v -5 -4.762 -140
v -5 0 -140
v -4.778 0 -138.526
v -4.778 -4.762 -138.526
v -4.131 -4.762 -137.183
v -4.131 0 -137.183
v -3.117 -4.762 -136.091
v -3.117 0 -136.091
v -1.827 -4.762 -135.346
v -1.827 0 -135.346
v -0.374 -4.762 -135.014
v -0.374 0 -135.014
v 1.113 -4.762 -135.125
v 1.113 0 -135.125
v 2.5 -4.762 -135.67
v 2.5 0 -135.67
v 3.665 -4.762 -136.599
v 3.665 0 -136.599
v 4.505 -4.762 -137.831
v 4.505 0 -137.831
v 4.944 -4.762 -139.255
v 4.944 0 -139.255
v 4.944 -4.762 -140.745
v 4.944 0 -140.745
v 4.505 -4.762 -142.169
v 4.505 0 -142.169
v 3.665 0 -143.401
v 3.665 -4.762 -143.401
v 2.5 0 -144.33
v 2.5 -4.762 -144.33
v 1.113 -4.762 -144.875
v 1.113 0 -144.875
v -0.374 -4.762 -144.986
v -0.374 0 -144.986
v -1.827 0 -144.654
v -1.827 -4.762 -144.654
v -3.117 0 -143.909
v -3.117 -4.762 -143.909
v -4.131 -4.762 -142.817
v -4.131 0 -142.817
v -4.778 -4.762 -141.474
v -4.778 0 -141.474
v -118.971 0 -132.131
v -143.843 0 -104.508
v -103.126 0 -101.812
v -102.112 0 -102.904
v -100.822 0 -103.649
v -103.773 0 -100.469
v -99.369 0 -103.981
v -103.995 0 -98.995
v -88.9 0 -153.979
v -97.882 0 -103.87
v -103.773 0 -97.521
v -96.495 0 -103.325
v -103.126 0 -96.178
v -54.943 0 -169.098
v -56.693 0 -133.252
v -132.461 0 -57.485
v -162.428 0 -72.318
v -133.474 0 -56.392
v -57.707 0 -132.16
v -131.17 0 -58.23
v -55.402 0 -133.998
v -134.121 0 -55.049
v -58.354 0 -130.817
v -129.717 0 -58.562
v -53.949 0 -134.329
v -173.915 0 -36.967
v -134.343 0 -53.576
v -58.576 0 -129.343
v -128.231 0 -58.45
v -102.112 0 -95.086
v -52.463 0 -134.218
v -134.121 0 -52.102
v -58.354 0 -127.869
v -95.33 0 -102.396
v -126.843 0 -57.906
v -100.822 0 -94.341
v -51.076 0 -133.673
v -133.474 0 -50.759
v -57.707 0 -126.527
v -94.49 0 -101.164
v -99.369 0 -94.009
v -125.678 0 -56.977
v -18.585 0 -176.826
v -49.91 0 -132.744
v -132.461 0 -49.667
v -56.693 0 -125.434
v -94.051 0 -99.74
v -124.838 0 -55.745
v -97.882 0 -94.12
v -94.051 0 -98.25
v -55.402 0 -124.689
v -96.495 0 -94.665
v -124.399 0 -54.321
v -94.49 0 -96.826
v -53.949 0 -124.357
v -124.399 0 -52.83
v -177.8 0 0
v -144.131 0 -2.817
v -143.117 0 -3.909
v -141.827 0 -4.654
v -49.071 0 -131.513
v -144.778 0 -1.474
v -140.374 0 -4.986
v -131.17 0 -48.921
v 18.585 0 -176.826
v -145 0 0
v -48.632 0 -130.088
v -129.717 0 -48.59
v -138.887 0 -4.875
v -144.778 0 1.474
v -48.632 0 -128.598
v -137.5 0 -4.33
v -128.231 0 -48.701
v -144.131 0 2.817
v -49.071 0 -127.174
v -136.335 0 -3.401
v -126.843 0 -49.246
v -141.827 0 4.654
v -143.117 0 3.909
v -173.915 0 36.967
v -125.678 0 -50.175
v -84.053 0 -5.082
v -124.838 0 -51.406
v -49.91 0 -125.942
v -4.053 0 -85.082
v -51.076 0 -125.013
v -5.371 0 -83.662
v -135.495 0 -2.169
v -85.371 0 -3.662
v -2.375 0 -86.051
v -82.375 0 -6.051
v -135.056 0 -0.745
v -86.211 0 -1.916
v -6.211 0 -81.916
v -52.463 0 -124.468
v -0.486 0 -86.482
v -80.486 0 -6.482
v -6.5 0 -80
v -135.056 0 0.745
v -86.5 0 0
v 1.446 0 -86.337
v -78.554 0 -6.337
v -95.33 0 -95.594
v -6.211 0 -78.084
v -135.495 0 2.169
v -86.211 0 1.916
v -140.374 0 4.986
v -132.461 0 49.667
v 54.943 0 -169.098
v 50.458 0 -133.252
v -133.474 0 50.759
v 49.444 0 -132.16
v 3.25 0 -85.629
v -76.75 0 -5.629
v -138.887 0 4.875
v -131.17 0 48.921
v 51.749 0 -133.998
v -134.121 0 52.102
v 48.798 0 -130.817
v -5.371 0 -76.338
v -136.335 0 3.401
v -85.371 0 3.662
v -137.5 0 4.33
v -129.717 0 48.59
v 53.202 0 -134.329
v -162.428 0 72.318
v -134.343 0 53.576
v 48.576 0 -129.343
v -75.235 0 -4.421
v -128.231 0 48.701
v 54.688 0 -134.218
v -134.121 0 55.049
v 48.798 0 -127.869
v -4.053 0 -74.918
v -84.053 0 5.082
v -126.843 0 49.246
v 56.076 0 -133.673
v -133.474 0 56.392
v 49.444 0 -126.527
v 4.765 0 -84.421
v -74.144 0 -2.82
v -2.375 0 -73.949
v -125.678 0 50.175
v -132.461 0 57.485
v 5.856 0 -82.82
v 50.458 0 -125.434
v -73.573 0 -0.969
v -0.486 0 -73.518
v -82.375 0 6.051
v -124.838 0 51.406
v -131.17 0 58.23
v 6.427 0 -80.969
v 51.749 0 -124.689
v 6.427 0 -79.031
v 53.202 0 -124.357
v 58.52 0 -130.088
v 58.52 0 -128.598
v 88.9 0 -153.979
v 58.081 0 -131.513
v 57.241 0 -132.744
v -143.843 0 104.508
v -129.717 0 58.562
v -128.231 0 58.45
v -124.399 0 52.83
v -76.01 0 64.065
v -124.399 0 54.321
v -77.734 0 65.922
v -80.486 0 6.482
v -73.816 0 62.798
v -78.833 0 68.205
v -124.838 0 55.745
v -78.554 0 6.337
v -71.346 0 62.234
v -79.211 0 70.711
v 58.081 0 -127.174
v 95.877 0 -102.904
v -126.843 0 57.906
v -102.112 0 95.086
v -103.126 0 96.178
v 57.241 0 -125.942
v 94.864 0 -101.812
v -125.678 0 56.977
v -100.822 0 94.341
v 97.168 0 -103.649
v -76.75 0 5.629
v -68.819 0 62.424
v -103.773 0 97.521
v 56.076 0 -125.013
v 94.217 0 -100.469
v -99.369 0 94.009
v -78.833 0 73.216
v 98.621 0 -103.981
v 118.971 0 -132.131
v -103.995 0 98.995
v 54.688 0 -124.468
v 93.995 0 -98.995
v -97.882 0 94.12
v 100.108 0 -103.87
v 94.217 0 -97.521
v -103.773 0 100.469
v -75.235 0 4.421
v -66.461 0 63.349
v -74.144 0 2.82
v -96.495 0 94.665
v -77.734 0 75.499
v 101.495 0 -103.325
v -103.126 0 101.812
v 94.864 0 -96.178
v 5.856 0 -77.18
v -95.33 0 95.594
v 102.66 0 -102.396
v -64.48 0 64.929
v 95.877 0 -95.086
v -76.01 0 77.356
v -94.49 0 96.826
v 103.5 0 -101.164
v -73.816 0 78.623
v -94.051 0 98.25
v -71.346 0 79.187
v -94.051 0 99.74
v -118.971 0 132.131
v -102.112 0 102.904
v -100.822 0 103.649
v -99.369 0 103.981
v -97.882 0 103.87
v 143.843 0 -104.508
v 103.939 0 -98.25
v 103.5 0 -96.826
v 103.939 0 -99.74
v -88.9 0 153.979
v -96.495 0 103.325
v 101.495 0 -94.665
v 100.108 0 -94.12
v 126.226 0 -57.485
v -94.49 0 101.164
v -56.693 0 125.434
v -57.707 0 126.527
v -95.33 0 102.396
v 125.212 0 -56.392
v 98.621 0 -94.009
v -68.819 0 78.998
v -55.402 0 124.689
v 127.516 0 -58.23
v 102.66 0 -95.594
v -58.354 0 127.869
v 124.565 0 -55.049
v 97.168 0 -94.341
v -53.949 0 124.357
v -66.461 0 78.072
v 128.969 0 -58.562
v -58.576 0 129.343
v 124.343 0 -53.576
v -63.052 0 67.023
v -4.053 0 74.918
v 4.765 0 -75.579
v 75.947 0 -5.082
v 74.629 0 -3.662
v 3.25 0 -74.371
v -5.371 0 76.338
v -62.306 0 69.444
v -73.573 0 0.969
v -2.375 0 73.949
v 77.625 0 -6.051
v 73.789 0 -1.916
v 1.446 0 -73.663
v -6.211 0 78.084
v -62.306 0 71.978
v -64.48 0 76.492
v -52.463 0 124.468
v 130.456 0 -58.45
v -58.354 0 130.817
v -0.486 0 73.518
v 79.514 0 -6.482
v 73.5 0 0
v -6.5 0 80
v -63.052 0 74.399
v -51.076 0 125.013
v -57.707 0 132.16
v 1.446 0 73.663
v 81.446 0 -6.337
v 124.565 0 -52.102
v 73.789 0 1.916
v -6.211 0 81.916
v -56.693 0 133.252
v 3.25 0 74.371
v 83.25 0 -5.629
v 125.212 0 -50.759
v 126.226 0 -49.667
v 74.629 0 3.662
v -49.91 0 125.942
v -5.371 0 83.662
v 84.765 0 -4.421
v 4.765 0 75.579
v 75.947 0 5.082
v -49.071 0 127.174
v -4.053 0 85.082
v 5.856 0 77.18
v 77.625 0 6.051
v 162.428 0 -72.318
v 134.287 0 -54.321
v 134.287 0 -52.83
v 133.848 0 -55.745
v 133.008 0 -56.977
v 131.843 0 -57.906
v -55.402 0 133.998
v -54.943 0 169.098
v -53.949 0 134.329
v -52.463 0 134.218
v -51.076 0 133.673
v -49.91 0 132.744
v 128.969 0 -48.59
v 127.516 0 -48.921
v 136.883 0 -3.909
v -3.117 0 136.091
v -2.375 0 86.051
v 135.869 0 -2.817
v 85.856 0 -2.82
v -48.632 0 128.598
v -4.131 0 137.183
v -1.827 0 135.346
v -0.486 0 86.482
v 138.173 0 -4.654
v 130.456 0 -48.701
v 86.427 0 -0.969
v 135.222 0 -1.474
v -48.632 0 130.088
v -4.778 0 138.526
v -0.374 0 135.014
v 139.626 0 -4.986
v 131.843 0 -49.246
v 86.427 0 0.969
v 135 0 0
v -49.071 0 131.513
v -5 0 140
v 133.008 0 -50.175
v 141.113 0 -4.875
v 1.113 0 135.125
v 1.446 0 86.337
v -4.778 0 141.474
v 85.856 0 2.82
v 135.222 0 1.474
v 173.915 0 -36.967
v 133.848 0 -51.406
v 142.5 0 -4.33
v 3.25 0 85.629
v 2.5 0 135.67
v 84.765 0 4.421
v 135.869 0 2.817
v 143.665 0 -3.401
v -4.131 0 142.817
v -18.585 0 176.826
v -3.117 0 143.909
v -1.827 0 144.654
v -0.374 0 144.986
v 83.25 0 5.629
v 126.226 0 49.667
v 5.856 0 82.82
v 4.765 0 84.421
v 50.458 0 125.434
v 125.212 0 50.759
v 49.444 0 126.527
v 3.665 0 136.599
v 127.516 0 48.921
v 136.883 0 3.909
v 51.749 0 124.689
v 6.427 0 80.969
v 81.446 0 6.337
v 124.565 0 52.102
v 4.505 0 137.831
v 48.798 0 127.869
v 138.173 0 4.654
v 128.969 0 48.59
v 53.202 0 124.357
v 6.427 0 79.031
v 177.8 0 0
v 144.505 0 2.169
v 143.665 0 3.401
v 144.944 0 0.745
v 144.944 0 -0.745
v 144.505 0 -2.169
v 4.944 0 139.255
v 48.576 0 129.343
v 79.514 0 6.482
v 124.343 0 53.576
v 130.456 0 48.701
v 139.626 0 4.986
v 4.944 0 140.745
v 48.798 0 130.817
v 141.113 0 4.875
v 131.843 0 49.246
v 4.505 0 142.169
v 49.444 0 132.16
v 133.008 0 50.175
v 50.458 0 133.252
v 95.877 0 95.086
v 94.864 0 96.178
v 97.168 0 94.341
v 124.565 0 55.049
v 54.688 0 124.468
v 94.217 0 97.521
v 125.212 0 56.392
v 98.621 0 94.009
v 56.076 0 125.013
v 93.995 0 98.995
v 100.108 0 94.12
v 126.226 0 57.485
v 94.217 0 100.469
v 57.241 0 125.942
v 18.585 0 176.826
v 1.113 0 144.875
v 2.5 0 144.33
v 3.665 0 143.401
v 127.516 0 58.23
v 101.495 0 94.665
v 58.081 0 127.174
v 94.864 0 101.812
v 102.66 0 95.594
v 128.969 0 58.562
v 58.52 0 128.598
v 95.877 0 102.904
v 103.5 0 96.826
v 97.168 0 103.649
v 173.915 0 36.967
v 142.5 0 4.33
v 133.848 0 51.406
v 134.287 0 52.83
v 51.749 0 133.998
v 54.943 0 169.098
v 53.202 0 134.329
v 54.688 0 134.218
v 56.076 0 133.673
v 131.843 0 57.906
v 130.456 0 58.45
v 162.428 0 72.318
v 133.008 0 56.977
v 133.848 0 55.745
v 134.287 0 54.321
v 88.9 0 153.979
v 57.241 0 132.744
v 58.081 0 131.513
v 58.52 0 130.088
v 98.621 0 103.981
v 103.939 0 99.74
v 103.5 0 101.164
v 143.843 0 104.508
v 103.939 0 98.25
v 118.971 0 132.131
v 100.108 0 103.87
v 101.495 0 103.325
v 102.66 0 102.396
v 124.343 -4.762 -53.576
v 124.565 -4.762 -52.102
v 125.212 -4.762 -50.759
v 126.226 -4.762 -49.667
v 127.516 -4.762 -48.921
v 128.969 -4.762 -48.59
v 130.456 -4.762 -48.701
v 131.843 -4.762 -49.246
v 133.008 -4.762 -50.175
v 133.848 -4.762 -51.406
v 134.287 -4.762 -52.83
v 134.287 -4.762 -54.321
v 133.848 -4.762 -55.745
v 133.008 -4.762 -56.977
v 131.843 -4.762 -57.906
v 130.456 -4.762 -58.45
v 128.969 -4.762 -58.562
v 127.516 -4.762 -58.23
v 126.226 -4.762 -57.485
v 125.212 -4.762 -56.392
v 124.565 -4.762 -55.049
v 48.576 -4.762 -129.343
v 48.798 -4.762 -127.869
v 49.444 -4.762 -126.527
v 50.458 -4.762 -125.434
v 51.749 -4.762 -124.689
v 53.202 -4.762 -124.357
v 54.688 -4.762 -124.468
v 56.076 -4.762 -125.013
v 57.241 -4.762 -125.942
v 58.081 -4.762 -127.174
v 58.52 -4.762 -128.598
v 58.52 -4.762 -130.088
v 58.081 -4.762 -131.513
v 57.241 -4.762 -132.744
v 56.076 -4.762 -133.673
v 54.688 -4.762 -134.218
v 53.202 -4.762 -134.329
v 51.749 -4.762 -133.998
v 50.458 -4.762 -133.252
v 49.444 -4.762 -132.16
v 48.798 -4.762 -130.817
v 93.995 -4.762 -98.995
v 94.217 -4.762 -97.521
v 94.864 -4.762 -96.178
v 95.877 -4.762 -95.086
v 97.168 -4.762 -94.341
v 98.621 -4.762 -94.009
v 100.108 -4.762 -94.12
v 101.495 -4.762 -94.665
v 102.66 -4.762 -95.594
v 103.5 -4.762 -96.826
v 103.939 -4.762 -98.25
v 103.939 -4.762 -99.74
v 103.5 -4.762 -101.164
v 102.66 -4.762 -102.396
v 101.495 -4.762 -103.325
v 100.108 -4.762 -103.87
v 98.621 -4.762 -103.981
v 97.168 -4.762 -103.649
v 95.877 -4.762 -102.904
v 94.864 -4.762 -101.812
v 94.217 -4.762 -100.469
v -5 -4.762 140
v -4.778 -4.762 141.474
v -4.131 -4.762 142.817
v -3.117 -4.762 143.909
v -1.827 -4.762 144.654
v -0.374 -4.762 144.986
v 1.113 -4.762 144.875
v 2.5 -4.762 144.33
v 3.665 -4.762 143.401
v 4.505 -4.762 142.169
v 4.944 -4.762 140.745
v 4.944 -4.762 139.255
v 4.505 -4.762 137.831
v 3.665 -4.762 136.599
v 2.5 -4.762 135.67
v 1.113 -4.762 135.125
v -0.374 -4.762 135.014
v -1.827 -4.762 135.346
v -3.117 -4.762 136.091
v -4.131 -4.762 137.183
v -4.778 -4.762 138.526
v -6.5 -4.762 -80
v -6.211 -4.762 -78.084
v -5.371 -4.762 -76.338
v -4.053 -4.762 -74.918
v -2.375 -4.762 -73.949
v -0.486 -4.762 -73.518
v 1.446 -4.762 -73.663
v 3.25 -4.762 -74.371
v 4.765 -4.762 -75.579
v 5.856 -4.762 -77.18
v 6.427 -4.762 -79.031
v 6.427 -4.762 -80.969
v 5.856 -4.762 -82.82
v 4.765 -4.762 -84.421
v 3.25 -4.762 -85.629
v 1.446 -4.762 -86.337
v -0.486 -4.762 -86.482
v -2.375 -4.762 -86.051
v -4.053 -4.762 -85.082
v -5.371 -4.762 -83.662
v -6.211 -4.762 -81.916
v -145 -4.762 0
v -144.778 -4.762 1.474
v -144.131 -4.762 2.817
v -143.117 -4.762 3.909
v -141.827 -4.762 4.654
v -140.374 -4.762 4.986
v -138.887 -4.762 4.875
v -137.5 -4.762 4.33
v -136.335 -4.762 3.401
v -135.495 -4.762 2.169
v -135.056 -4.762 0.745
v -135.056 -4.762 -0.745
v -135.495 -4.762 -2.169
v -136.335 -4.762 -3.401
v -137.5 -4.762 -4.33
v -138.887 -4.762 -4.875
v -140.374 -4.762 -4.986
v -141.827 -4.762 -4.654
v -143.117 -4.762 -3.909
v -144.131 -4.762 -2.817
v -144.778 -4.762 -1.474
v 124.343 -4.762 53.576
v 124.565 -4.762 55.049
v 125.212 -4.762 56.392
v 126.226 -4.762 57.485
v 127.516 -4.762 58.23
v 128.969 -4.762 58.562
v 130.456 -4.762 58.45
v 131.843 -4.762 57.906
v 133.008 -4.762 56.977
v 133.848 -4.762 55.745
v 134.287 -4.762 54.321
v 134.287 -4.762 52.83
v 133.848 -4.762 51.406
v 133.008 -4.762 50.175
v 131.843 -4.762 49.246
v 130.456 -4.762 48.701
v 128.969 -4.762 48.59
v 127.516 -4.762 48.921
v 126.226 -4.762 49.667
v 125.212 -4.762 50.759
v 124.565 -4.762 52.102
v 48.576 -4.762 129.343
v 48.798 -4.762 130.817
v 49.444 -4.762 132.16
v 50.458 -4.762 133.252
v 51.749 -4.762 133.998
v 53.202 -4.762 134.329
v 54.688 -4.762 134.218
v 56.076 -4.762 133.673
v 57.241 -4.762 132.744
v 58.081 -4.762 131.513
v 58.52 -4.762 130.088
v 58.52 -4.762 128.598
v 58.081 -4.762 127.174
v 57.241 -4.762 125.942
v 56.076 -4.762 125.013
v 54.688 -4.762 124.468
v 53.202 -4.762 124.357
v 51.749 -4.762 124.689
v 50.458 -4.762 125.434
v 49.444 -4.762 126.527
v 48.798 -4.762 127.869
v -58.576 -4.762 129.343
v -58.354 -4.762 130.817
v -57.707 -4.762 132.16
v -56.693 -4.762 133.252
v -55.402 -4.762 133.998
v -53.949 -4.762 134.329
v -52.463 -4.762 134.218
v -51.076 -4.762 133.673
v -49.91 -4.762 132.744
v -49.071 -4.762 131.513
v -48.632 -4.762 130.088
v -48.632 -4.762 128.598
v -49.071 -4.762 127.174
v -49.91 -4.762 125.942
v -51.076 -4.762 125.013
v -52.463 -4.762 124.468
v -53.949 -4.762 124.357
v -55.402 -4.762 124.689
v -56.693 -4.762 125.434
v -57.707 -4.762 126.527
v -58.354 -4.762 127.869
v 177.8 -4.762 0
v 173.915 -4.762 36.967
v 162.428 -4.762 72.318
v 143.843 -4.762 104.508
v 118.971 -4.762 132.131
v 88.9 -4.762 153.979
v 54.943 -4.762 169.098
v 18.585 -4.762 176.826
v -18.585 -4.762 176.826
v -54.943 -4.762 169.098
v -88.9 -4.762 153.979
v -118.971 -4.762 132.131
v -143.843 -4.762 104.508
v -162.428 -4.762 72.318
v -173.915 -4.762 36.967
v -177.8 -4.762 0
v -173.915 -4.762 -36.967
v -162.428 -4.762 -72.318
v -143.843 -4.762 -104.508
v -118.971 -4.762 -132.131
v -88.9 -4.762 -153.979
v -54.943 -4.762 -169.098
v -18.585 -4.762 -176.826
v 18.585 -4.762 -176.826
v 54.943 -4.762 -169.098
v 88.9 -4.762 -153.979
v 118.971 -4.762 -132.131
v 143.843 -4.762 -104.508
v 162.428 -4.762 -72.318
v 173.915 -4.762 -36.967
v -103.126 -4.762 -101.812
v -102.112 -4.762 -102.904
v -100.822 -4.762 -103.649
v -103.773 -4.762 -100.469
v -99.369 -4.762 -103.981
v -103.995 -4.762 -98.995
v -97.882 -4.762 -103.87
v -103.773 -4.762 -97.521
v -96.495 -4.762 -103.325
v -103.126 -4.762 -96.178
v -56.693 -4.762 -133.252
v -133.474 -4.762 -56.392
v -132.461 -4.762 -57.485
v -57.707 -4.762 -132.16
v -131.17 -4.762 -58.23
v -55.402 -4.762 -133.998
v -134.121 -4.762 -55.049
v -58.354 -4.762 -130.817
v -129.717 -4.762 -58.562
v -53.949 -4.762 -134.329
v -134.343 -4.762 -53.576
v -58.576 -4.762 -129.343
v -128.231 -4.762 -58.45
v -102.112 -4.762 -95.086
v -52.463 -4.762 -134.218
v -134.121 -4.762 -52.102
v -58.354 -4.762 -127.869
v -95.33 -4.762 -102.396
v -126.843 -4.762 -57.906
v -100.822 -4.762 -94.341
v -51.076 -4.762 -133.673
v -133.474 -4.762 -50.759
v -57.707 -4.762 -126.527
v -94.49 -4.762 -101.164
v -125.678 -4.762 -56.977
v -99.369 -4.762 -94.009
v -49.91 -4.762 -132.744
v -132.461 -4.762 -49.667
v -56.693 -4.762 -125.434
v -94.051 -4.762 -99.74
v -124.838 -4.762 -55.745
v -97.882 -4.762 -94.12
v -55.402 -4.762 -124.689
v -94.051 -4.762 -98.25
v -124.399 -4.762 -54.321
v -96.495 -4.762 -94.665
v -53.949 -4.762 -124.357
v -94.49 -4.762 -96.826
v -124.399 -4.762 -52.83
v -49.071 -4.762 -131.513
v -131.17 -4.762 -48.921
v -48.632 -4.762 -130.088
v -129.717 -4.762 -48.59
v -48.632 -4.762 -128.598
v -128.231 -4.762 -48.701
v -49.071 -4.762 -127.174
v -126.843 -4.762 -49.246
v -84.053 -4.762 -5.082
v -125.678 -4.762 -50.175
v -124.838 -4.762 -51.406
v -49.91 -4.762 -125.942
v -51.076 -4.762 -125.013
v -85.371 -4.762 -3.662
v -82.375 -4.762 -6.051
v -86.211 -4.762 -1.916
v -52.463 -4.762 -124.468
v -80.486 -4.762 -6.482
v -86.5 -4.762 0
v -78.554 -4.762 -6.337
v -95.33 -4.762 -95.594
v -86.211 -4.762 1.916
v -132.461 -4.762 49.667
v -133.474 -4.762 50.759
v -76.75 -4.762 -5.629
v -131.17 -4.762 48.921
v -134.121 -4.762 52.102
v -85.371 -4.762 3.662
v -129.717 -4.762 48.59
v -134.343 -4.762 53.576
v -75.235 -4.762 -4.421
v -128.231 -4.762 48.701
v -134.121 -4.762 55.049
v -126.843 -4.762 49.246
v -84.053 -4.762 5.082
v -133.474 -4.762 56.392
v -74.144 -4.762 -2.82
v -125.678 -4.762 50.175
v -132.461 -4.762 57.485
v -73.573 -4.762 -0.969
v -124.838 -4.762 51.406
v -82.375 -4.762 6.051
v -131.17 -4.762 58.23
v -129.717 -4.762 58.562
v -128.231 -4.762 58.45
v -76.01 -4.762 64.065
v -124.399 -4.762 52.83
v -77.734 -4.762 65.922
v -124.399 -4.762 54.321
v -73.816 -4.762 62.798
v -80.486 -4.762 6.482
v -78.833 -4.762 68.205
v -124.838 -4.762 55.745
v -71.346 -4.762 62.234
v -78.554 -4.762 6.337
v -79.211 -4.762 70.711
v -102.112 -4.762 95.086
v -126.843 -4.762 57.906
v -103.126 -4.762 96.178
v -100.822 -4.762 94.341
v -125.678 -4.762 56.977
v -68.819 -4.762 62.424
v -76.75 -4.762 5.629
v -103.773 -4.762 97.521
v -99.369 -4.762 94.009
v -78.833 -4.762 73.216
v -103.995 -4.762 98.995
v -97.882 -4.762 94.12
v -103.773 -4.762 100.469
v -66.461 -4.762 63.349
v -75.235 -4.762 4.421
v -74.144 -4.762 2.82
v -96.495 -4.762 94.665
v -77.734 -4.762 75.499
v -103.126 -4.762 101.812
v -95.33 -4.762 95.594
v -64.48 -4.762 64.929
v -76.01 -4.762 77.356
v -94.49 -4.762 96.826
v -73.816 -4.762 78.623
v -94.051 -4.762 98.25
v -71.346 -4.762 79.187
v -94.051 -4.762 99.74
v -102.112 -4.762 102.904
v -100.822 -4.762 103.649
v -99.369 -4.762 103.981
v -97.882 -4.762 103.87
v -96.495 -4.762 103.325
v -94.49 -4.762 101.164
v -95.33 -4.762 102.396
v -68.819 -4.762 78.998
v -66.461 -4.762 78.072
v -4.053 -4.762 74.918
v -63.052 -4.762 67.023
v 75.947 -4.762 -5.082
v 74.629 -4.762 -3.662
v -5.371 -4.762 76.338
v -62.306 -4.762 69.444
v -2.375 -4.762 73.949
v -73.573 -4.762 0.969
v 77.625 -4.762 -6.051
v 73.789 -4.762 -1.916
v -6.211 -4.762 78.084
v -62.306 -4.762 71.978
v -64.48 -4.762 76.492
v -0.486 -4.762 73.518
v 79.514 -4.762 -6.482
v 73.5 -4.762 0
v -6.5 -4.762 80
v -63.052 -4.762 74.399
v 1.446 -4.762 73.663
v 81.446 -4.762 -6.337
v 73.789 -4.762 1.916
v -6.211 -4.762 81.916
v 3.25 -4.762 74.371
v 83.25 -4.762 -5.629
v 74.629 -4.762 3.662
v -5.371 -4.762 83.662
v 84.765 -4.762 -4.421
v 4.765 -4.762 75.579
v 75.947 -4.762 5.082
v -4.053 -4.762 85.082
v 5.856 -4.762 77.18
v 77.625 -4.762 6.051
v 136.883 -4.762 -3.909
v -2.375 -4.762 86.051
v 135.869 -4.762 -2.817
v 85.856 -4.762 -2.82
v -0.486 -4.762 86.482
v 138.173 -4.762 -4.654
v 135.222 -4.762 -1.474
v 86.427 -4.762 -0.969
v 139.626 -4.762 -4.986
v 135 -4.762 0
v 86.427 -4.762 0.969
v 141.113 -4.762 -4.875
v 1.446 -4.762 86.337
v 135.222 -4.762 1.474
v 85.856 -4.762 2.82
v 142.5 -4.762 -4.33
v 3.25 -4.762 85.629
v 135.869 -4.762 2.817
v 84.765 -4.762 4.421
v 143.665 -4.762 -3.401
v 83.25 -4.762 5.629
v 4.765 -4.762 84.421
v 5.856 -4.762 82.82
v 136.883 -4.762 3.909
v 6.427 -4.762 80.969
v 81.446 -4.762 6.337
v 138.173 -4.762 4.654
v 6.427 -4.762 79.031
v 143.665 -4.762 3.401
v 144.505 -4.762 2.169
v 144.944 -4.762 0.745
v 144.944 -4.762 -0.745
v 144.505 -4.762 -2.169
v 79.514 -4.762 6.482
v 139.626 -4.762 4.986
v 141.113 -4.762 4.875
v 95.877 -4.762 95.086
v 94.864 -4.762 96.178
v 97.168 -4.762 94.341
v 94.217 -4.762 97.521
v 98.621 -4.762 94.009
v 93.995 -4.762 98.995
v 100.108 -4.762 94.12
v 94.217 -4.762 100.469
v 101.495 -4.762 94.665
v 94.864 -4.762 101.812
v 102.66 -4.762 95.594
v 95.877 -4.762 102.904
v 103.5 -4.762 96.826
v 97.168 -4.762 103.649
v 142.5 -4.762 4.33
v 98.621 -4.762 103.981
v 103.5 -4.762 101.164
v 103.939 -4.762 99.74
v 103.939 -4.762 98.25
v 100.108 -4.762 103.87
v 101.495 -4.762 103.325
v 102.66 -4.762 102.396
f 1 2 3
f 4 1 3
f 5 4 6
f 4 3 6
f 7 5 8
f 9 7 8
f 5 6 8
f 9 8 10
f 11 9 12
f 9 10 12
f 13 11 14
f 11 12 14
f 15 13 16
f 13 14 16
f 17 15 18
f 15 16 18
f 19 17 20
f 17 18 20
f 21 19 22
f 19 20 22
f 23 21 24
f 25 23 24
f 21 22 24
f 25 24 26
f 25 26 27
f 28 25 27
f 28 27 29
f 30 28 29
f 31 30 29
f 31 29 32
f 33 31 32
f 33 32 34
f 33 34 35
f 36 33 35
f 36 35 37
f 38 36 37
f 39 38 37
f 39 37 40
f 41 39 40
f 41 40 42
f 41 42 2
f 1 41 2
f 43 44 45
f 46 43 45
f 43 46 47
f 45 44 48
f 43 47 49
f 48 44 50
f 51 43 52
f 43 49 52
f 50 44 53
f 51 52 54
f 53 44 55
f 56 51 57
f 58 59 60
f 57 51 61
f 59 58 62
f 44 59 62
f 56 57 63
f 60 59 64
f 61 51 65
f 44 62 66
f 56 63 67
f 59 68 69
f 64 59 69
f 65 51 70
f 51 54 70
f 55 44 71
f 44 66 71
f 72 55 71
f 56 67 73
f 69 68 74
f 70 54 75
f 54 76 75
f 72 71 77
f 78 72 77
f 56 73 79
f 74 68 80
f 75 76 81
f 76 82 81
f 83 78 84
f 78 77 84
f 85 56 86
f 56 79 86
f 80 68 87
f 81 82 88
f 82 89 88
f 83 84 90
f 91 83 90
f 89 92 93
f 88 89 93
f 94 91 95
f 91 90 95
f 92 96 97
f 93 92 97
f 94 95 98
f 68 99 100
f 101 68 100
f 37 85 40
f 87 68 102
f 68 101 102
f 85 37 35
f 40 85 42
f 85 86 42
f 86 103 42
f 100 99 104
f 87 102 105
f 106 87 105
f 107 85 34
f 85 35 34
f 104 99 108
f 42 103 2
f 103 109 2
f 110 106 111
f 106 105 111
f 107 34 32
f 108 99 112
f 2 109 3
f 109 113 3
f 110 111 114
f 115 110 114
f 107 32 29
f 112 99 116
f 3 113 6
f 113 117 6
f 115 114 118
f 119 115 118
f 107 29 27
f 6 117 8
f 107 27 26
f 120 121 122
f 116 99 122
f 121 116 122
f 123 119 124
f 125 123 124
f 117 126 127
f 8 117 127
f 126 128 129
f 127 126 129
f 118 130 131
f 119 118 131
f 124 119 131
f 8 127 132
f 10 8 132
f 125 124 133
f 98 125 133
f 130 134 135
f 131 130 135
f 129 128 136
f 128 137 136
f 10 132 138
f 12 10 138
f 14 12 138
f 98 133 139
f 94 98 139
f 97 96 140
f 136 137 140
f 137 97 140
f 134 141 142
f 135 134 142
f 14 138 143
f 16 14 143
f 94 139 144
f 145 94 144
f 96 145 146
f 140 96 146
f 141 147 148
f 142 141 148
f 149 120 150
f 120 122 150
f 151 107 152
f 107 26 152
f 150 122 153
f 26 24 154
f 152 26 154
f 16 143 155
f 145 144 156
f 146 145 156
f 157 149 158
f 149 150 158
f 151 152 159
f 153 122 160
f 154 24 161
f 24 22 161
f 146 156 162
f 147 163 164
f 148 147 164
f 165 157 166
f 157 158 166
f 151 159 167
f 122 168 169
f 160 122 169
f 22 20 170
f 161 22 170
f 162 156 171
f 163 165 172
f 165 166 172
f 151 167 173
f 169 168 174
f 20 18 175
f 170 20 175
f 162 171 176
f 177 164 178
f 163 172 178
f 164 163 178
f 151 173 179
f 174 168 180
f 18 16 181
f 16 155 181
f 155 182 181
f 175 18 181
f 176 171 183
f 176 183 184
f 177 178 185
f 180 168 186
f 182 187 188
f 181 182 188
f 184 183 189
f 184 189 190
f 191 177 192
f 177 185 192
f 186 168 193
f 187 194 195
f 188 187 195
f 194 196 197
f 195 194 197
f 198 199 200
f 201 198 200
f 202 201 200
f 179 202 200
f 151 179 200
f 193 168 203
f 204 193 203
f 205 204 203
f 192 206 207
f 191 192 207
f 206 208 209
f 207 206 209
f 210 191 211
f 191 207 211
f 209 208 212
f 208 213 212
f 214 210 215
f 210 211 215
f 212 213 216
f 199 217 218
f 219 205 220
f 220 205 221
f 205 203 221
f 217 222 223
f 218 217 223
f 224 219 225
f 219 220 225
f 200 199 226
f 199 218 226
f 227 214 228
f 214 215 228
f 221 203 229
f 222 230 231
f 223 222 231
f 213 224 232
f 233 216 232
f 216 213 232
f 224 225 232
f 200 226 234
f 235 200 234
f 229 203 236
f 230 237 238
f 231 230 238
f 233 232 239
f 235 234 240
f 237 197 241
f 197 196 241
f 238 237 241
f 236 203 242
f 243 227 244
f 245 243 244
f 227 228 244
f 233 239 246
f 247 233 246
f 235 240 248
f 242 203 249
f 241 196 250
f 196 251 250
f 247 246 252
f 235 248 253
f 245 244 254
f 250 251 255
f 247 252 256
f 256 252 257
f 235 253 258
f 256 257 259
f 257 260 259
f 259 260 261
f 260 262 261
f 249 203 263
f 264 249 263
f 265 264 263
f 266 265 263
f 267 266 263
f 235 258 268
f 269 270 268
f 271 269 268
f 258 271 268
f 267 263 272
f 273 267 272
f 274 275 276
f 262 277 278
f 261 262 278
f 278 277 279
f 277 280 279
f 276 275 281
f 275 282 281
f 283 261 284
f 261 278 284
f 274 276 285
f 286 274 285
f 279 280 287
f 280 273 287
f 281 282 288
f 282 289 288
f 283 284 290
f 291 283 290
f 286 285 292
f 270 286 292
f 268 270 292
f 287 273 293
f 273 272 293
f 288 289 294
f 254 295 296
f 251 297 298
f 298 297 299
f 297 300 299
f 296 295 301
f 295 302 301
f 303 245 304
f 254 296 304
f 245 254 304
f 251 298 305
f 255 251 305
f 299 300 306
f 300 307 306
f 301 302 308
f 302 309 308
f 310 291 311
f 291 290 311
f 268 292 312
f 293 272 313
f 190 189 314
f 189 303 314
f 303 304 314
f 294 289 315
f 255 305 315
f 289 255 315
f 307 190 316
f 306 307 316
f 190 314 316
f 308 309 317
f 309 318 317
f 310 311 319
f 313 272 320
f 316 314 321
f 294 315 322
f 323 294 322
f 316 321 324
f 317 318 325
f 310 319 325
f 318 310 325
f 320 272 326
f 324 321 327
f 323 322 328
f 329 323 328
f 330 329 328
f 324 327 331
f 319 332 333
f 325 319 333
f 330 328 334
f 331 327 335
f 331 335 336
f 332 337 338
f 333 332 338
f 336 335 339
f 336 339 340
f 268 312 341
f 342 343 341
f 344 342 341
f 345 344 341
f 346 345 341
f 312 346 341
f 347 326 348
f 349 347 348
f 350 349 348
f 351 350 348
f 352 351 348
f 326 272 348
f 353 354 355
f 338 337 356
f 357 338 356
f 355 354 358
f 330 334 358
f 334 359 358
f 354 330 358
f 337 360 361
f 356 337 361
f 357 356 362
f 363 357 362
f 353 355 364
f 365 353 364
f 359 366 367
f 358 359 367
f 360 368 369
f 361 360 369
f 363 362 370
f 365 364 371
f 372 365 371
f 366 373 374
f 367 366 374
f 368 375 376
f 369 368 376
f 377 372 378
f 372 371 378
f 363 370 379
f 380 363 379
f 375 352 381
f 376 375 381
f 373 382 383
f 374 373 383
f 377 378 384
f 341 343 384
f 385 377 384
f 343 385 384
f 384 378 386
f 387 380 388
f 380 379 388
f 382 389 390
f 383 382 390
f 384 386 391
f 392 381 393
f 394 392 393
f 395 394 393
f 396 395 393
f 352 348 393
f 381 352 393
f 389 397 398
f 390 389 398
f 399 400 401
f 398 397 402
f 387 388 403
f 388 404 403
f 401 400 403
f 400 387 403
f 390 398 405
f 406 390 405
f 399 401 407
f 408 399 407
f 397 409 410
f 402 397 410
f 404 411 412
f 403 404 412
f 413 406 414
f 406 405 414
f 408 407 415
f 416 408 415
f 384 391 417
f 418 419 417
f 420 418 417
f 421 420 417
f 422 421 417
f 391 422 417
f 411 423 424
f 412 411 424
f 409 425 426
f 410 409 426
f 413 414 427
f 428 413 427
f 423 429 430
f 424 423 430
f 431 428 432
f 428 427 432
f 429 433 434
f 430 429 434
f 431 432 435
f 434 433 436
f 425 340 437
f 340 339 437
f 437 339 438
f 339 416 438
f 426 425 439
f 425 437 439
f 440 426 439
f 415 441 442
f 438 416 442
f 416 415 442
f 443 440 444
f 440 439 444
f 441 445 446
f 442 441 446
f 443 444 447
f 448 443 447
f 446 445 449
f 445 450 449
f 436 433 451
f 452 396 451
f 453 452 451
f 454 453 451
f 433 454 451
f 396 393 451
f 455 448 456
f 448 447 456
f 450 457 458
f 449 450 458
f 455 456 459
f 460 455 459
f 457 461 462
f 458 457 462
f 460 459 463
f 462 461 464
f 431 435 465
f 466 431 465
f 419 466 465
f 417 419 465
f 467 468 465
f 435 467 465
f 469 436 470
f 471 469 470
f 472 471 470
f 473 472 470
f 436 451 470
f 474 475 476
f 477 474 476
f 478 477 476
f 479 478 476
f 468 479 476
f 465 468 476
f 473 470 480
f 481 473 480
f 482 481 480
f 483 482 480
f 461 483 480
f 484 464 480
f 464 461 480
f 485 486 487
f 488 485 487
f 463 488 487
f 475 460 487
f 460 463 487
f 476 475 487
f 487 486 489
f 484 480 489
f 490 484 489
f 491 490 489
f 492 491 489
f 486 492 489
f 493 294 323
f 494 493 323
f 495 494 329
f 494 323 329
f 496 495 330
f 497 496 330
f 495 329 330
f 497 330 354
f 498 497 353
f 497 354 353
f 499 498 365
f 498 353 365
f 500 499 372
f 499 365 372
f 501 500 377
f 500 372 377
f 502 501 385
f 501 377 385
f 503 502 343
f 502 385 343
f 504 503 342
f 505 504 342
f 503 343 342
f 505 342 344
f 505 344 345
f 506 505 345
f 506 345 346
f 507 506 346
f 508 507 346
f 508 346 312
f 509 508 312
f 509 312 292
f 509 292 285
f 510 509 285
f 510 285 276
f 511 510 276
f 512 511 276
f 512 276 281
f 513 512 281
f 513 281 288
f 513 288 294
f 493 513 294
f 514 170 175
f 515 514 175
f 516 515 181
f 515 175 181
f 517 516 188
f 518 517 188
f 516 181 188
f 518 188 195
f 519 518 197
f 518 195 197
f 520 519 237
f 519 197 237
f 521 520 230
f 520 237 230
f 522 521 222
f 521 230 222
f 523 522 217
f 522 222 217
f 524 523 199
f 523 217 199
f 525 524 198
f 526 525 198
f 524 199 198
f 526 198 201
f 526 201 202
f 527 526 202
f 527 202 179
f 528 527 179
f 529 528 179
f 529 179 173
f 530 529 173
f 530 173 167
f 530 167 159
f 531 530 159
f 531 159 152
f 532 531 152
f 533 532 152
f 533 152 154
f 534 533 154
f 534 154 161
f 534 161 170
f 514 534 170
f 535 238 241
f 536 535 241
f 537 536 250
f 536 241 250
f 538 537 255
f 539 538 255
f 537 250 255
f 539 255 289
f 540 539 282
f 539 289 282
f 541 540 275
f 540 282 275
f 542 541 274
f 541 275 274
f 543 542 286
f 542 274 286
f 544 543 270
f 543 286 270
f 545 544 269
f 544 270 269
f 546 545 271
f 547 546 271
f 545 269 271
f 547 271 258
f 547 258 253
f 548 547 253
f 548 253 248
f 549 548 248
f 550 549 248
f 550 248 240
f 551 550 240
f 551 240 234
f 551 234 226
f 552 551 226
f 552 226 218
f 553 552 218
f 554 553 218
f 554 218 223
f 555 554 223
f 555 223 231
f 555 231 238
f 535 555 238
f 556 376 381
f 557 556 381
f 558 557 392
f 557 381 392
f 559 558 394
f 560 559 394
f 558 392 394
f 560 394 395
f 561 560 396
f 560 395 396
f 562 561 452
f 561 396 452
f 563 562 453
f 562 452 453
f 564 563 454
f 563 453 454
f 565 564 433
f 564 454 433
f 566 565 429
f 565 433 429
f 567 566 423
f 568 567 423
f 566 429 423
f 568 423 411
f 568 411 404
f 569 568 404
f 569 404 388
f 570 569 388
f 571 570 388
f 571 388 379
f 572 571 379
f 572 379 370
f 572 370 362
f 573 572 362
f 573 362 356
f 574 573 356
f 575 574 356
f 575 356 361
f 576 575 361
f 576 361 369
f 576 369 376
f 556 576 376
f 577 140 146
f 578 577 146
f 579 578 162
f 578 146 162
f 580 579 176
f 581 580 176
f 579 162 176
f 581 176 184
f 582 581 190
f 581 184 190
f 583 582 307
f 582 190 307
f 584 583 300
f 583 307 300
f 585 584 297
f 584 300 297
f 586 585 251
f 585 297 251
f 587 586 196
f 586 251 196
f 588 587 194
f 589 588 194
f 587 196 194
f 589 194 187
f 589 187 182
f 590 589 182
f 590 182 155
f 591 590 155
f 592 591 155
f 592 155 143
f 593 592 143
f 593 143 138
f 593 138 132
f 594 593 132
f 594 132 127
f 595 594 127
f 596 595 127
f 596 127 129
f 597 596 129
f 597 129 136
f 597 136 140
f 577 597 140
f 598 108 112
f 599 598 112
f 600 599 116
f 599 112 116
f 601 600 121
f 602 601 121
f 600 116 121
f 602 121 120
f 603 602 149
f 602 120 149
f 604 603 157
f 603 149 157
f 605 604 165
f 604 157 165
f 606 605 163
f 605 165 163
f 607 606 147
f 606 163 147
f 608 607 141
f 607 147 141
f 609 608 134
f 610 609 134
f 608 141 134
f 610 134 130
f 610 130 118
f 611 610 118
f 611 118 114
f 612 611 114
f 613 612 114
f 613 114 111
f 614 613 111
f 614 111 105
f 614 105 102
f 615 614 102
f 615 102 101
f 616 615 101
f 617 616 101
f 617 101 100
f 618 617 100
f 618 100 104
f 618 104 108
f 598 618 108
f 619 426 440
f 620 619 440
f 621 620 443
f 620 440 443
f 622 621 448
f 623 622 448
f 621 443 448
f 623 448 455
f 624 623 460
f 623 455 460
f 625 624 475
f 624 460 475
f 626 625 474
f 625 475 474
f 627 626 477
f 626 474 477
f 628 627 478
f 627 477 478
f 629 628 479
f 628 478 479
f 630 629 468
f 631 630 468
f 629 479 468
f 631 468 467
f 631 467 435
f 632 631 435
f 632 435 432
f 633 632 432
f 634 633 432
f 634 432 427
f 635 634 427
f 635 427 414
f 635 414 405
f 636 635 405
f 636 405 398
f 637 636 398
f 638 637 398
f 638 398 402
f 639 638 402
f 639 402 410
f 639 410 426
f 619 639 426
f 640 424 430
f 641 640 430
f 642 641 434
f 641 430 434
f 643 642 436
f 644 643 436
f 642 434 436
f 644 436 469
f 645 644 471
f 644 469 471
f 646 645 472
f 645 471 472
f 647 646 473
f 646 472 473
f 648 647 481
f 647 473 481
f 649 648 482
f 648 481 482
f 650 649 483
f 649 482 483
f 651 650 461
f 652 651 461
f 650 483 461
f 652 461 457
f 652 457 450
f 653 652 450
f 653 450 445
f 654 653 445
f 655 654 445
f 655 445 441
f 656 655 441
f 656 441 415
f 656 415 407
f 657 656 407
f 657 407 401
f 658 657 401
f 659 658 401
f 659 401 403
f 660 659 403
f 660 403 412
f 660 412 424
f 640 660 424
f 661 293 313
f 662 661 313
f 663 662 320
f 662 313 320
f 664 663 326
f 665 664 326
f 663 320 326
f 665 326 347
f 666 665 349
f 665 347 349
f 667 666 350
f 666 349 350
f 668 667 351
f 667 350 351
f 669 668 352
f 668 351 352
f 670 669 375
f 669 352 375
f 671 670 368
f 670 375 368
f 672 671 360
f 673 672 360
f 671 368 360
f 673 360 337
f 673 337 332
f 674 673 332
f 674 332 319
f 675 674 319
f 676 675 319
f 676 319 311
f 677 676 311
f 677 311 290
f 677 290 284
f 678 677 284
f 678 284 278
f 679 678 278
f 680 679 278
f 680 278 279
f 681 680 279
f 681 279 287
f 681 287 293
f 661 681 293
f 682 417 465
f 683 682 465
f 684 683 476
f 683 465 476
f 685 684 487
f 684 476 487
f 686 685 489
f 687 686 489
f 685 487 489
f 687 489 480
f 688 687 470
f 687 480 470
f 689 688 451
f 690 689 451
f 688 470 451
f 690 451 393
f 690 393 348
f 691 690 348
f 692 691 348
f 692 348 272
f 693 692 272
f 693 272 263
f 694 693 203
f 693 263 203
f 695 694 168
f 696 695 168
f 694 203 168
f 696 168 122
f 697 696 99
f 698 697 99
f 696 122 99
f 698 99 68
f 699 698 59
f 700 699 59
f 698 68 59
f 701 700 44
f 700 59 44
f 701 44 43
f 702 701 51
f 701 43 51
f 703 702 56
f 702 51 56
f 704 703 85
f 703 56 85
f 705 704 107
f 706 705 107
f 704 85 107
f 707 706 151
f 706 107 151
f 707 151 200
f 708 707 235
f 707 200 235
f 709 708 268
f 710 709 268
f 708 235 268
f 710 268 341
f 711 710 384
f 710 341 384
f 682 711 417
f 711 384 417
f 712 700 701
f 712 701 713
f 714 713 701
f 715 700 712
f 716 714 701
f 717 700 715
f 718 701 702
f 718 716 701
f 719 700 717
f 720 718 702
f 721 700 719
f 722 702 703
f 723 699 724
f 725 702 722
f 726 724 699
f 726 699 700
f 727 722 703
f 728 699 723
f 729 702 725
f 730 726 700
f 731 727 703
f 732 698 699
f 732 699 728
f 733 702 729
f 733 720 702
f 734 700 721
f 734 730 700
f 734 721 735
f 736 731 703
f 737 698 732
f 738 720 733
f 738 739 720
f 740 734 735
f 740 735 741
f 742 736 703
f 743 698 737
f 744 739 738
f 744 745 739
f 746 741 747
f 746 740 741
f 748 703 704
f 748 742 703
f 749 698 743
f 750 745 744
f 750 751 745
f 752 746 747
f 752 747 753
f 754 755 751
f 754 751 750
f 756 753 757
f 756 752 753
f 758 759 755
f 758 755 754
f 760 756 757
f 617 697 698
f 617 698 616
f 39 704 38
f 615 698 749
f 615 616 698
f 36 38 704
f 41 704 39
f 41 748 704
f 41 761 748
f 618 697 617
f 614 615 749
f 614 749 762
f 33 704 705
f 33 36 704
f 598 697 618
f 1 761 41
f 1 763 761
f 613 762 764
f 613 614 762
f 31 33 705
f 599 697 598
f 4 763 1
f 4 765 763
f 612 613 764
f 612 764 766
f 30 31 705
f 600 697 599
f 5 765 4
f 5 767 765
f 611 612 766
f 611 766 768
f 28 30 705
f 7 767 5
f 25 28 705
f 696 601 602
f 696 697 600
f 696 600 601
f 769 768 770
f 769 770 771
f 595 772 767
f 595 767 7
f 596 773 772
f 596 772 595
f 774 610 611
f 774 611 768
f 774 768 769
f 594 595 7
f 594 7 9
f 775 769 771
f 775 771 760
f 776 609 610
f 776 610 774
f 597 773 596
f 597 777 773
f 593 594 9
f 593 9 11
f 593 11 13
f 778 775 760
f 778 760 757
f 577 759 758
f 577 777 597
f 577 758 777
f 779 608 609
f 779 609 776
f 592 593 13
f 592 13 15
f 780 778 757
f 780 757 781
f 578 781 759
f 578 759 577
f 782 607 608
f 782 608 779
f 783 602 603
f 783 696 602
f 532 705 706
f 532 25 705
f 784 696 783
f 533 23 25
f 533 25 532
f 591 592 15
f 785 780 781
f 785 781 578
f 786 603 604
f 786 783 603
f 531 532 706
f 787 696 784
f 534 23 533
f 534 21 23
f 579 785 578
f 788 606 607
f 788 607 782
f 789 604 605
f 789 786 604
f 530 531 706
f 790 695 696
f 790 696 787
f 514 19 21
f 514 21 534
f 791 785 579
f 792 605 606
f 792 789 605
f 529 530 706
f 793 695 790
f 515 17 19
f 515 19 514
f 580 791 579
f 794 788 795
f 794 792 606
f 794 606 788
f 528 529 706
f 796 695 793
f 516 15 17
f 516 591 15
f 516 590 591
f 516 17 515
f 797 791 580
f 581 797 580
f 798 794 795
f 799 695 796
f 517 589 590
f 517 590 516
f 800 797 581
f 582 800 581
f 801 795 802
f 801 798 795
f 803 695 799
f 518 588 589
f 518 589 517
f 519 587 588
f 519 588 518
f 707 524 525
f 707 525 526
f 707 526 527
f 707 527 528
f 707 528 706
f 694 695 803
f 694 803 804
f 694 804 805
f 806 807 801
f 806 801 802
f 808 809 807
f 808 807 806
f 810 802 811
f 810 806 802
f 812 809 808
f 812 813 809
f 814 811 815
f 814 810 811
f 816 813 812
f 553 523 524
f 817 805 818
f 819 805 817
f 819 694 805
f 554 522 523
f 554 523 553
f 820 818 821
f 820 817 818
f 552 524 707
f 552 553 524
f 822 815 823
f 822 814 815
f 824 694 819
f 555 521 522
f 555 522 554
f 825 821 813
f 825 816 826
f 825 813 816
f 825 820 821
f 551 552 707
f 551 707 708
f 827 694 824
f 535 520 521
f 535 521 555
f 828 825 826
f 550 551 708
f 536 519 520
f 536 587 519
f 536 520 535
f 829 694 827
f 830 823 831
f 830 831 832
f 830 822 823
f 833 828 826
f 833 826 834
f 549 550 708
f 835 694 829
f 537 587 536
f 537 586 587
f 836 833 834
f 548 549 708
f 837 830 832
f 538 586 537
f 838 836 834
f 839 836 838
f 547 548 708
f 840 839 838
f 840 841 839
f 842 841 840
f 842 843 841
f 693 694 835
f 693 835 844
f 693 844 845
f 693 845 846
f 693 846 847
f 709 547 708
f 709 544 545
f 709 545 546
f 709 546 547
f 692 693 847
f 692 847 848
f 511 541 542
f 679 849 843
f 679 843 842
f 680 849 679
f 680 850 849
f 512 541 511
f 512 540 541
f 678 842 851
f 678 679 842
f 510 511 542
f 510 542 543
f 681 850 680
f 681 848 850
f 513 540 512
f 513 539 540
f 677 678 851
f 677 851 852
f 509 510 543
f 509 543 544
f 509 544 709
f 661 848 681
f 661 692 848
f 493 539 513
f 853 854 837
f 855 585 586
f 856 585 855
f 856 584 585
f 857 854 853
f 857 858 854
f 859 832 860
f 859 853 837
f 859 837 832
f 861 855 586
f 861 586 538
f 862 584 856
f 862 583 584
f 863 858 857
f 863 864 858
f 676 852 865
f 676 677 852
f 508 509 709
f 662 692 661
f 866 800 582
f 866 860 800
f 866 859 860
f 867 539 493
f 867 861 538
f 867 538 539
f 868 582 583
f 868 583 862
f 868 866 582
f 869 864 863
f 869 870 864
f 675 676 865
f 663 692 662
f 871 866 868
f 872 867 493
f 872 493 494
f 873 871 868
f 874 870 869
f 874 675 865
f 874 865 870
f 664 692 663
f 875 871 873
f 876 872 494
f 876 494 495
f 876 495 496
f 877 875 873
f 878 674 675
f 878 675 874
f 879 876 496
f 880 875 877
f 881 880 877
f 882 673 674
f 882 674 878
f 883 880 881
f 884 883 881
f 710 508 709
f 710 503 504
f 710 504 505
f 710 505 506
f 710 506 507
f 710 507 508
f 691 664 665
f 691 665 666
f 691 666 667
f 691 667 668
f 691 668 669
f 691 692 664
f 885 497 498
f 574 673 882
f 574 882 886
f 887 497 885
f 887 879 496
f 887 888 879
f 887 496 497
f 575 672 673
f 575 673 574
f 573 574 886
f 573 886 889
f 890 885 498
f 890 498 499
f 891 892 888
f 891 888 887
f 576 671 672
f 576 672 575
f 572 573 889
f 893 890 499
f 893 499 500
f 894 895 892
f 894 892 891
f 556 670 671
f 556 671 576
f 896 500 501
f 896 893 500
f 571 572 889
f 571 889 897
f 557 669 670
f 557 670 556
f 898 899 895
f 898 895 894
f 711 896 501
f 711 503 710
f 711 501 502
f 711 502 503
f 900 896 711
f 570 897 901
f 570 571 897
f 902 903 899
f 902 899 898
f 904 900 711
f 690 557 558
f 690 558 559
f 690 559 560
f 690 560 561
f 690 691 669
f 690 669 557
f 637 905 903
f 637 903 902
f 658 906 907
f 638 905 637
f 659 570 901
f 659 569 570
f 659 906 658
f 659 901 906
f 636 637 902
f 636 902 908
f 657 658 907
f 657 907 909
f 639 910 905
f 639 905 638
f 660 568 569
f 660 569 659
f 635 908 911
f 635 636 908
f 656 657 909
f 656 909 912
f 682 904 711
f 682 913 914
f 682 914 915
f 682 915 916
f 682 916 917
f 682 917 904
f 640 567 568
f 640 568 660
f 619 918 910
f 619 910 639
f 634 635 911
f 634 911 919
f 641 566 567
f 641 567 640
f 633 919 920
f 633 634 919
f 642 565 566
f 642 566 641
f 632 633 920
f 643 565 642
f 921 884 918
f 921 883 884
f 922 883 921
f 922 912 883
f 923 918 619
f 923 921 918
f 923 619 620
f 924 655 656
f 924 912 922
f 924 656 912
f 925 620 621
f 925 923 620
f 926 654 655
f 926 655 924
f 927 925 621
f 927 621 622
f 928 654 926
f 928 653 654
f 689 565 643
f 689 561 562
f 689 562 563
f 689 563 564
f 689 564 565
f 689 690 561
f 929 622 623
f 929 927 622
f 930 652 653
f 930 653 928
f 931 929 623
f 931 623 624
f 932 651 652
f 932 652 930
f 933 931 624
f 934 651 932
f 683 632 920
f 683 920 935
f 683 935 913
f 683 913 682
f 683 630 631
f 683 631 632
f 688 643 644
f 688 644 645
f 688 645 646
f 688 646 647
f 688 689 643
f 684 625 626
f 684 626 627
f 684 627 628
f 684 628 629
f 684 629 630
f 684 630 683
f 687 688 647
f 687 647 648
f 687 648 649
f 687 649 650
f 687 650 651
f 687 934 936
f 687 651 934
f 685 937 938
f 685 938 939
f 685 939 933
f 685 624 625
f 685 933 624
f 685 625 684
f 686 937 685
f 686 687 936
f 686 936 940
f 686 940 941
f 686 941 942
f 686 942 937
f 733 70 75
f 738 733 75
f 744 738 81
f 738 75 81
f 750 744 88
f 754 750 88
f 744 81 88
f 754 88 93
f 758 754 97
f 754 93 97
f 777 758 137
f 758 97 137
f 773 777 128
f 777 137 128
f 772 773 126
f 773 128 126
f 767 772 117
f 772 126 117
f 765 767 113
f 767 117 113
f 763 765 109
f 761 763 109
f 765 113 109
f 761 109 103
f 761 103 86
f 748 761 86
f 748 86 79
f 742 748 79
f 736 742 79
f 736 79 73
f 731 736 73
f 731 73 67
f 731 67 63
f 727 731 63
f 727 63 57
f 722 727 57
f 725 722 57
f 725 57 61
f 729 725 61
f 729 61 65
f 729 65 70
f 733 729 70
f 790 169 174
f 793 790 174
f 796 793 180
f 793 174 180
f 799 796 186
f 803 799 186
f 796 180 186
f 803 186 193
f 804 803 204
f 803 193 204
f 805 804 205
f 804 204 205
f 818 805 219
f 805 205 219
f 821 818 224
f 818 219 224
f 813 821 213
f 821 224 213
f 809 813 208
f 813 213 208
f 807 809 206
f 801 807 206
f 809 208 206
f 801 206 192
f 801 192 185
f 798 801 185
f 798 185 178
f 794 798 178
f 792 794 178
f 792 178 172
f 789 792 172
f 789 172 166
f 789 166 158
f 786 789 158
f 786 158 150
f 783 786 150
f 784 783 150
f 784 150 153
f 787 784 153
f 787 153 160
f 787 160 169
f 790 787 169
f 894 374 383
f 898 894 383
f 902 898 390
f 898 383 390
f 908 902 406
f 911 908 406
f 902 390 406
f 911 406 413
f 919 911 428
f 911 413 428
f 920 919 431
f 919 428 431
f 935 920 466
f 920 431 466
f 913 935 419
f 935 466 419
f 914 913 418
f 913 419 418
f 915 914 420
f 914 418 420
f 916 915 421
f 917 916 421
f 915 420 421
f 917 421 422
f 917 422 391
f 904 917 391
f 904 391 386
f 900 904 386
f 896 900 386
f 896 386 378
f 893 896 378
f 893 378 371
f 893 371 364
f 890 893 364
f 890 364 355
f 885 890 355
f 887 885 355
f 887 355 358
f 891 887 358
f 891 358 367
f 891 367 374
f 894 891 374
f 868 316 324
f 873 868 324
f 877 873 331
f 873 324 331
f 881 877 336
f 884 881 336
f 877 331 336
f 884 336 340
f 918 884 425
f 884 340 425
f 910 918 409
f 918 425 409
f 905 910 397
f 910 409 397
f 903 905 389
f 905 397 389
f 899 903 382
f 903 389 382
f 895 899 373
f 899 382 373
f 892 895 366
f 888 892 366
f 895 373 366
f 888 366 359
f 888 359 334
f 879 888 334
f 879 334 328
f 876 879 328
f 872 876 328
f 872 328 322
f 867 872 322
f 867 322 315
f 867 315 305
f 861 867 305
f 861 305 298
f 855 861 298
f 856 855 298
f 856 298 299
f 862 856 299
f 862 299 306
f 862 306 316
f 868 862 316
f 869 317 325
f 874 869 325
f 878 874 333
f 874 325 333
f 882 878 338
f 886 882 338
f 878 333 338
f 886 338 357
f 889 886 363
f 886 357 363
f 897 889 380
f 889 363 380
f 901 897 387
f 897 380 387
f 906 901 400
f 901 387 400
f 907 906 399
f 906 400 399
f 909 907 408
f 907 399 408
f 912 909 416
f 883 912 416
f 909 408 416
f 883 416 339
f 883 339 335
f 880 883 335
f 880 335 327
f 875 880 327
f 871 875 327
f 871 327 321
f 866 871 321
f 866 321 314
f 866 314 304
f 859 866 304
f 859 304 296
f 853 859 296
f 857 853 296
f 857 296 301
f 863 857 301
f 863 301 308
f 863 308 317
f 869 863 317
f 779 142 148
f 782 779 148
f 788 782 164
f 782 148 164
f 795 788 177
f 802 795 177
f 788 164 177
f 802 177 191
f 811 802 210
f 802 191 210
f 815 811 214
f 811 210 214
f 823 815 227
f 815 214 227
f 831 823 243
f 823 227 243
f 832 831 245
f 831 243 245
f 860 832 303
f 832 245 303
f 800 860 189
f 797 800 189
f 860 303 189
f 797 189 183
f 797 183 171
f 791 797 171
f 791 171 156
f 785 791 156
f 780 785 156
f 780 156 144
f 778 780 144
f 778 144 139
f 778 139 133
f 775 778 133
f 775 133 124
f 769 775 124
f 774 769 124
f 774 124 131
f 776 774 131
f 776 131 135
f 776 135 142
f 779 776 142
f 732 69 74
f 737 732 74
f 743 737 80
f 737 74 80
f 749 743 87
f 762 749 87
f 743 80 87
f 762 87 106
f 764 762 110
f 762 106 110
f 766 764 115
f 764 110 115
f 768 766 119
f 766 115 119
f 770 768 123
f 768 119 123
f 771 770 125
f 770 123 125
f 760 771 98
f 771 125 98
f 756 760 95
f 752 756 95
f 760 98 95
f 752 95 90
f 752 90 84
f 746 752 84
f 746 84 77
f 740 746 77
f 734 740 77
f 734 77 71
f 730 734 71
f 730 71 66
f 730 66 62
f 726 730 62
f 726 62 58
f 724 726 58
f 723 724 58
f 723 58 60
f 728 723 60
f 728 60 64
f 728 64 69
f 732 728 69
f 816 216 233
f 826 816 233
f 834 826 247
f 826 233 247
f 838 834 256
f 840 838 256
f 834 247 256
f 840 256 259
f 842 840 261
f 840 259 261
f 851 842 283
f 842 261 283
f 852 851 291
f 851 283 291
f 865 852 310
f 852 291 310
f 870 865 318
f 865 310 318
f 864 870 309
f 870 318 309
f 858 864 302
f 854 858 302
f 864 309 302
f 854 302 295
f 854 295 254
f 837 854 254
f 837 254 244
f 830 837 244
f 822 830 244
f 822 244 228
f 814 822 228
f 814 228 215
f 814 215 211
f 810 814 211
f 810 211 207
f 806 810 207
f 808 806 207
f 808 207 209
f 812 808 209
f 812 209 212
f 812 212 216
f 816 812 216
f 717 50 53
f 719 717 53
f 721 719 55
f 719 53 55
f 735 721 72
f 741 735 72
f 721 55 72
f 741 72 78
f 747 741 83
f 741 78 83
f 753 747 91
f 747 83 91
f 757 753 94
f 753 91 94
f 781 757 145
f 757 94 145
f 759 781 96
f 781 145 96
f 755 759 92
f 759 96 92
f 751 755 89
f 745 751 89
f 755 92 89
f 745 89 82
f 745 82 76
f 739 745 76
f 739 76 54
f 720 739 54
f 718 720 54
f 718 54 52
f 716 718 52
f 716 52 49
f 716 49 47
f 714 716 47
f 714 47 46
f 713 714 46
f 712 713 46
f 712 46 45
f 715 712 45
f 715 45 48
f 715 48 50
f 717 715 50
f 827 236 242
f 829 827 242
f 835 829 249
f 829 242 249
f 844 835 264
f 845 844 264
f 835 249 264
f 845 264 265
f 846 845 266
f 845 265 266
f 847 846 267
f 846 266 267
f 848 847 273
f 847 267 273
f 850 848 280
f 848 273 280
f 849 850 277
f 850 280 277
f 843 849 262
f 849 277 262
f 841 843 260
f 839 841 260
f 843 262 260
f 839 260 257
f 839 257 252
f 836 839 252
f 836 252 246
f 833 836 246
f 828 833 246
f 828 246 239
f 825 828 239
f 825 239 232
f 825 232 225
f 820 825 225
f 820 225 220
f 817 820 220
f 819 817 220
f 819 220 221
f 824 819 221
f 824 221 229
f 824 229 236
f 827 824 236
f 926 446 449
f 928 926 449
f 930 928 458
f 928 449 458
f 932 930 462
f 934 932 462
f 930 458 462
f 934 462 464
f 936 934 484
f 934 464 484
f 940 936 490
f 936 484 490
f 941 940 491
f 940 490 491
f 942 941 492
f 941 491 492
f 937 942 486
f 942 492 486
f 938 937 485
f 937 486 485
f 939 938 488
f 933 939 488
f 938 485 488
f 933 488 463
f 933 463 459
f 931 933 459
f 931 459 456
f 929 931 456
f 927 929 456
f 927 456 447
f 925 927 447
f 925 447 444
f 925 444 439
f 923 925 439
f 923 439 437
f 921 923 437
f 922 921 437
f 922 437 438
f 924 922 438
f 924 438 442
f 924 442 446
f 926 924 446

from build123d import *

# Parameters (mm, degrees)
F0_R     = 177.8
F1_DEPTH = 4.7625
F3_D     = 10
F5_D     = 13
F7_D     = 17


with BuildPart() as f1:
    # F0 (on Front) → F1 (new body)
    with BuildSketch(Plane.XZ):
        Circle(F0_R)
    extrude(amount=F1_DEPTH)

    # F3 (through all)
    with Locations(Plane.XZ.offset(4.7625)):
        with Locations((0, 140), (53.575681, 129.343135), (98.994949, 98.994949), (129.343135, 53.575681), (140, 0), (129.343135, -53.575681), (98.994949, -98.994949), (53.575681, -129.343135), (0, -140), (-53.575681, -129.343135), (-98.994949, -98.994949), (-129.343135, -53.575681), (-140, 0), (-129.343135, 53.575681), (-98.994949, 98.994949), (-53.575681, 129.343135), (-53.575681, 129.343135)):
            Hole(F3_D / 2)

    # F5 (through all)
    with Locations(Plane.XZ.offset(4.7625)):
        with Locations((0, 80), (80, 0), (0, -80), (-80, 0)):
            Hole(F5_D / 2)

    # F7 (through all)
    with Locations(Plane.XZ.offset(4.7625)):
        with Locations((-70.710678, 70.710678)):
            Hole(F7_D / 2)


solid = f1.part
